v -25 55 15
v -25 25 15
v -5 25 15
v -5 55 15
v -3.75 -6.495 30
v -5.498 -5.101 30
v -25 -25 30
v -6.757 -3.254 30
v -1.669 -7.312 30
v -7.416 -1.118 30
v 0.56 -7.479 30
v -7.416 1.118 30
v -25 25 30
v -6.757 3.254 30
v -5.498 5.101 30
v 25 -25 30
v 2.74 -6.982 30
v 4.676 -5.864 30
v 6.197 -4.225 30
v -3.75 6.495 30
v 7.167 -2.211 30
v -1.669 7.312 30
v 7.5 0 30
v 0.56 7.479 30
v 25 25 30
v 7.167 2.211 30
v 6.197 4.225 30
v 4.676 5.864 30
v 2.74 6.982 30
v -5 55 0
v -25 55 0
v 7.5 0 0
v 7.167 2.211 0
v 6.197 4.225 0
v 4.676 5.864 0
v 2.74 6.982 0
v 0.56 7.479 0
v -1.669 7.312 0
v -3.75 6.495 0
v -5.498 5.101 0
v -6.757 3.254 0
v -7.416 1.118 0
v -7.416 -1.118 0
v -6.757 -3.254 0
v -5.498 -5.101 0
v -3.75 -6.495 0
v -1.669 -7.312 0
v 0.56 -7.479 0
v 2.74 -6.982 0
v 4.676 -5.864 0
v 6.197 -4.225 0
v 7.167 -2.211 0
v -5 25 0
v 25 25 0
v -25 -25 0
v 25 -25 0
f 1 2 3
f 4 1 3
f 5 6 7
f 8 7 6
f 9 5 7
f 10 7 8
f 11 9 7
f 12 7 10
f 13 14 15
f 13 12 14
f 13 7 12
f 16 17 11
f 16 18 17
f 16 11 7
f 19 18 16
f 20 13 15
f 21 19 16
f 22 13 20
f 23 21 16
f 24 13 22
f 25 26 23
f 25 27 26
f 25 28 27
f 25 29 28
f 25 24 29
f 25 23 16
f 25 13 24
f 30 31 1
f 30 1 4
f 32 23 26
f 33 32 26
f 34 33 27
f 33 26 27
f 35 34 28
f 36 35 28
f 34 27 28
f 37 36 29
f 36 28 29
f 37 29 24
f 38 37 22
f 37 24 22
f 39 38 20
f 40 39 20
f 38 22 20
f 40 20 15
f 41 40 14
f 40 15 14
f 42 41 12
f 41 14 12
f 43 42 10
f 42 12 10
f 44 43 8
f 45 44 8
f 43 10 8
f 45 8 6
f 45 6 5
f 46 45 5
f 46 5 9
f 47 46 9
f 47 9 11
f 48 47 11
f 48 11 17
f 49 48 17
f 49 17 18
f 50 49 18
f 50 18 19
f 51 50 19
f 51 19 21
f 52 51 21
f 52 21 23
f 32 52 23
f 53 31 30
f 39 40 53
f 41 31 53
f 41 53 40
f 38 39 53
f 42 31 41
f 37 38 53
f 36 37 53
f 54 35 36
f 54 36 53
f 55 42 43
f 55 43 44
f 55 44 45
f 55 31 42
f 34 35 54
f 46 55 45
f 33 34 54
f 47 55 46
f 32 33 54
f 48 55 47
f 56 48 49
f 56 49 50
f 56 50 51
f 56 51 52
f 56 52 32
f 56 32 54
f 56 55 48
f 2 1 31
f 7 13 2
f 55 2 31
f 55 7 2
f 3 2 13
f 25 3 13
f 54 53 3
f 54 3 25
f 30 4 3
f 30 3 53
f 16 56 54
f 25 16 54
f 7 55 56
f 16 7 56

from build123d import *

# Parameters (mm, degrees)
SKETCH1_W           = 50
SKETCH1_H           = 50
BOSS_EXTRUDE1_DEPTH = 30
CUT_EXTRUDE1_REACH  = 48.368
SKETCH2_R           = 7.5
SKETCH4_W           = 20
SKETCH4_H           = 15
BOSS_EXTRUDE3_DEPTH = 30


with BuildPart() as part:
    # Sketch1 → Boss-Extrude1 (new body)
    with BuildSketch(Plane.XY):
        Rectangle(SKETCH1_W, SKETCH1_H)
    extrude(amount=BOSS_EXTRUDE1_DEPTH)

    # Sketch2 → Cut-Extrude1 (cut, up to next)
    with BuildSketch(Plane.XY.offset(30), mode=Mode.PRIVATE) as cut_extrude1_sk1:
        Circle(SKETCH2_R)
    cut_extrude1_tool1 = extrude(cut_extrude1_sk1.sketch, amount=-CUT_EXTRUDE1_REACH, mode=Mode.PRIVATE) & part.part
    add(cut_extrude1_tool1.solids().sort_by_distance((0, 0, 30))[0], mode=Mode.SUBTRACT)

    # Sketch4 → Boss-Extrude3 (add)
    with BuildSketch(Plane(origin=(0, 25, 0), x_dir=(1, 0, 0), z_dir=(0, 1, 0))):
        with Locations((-15, -7.5)):
            Rectangle(SKETCH4_W, SKETCH4_H)
    extrude(amount=BOSS_EXTRUDE3_DEPTH)


solid = part.part
